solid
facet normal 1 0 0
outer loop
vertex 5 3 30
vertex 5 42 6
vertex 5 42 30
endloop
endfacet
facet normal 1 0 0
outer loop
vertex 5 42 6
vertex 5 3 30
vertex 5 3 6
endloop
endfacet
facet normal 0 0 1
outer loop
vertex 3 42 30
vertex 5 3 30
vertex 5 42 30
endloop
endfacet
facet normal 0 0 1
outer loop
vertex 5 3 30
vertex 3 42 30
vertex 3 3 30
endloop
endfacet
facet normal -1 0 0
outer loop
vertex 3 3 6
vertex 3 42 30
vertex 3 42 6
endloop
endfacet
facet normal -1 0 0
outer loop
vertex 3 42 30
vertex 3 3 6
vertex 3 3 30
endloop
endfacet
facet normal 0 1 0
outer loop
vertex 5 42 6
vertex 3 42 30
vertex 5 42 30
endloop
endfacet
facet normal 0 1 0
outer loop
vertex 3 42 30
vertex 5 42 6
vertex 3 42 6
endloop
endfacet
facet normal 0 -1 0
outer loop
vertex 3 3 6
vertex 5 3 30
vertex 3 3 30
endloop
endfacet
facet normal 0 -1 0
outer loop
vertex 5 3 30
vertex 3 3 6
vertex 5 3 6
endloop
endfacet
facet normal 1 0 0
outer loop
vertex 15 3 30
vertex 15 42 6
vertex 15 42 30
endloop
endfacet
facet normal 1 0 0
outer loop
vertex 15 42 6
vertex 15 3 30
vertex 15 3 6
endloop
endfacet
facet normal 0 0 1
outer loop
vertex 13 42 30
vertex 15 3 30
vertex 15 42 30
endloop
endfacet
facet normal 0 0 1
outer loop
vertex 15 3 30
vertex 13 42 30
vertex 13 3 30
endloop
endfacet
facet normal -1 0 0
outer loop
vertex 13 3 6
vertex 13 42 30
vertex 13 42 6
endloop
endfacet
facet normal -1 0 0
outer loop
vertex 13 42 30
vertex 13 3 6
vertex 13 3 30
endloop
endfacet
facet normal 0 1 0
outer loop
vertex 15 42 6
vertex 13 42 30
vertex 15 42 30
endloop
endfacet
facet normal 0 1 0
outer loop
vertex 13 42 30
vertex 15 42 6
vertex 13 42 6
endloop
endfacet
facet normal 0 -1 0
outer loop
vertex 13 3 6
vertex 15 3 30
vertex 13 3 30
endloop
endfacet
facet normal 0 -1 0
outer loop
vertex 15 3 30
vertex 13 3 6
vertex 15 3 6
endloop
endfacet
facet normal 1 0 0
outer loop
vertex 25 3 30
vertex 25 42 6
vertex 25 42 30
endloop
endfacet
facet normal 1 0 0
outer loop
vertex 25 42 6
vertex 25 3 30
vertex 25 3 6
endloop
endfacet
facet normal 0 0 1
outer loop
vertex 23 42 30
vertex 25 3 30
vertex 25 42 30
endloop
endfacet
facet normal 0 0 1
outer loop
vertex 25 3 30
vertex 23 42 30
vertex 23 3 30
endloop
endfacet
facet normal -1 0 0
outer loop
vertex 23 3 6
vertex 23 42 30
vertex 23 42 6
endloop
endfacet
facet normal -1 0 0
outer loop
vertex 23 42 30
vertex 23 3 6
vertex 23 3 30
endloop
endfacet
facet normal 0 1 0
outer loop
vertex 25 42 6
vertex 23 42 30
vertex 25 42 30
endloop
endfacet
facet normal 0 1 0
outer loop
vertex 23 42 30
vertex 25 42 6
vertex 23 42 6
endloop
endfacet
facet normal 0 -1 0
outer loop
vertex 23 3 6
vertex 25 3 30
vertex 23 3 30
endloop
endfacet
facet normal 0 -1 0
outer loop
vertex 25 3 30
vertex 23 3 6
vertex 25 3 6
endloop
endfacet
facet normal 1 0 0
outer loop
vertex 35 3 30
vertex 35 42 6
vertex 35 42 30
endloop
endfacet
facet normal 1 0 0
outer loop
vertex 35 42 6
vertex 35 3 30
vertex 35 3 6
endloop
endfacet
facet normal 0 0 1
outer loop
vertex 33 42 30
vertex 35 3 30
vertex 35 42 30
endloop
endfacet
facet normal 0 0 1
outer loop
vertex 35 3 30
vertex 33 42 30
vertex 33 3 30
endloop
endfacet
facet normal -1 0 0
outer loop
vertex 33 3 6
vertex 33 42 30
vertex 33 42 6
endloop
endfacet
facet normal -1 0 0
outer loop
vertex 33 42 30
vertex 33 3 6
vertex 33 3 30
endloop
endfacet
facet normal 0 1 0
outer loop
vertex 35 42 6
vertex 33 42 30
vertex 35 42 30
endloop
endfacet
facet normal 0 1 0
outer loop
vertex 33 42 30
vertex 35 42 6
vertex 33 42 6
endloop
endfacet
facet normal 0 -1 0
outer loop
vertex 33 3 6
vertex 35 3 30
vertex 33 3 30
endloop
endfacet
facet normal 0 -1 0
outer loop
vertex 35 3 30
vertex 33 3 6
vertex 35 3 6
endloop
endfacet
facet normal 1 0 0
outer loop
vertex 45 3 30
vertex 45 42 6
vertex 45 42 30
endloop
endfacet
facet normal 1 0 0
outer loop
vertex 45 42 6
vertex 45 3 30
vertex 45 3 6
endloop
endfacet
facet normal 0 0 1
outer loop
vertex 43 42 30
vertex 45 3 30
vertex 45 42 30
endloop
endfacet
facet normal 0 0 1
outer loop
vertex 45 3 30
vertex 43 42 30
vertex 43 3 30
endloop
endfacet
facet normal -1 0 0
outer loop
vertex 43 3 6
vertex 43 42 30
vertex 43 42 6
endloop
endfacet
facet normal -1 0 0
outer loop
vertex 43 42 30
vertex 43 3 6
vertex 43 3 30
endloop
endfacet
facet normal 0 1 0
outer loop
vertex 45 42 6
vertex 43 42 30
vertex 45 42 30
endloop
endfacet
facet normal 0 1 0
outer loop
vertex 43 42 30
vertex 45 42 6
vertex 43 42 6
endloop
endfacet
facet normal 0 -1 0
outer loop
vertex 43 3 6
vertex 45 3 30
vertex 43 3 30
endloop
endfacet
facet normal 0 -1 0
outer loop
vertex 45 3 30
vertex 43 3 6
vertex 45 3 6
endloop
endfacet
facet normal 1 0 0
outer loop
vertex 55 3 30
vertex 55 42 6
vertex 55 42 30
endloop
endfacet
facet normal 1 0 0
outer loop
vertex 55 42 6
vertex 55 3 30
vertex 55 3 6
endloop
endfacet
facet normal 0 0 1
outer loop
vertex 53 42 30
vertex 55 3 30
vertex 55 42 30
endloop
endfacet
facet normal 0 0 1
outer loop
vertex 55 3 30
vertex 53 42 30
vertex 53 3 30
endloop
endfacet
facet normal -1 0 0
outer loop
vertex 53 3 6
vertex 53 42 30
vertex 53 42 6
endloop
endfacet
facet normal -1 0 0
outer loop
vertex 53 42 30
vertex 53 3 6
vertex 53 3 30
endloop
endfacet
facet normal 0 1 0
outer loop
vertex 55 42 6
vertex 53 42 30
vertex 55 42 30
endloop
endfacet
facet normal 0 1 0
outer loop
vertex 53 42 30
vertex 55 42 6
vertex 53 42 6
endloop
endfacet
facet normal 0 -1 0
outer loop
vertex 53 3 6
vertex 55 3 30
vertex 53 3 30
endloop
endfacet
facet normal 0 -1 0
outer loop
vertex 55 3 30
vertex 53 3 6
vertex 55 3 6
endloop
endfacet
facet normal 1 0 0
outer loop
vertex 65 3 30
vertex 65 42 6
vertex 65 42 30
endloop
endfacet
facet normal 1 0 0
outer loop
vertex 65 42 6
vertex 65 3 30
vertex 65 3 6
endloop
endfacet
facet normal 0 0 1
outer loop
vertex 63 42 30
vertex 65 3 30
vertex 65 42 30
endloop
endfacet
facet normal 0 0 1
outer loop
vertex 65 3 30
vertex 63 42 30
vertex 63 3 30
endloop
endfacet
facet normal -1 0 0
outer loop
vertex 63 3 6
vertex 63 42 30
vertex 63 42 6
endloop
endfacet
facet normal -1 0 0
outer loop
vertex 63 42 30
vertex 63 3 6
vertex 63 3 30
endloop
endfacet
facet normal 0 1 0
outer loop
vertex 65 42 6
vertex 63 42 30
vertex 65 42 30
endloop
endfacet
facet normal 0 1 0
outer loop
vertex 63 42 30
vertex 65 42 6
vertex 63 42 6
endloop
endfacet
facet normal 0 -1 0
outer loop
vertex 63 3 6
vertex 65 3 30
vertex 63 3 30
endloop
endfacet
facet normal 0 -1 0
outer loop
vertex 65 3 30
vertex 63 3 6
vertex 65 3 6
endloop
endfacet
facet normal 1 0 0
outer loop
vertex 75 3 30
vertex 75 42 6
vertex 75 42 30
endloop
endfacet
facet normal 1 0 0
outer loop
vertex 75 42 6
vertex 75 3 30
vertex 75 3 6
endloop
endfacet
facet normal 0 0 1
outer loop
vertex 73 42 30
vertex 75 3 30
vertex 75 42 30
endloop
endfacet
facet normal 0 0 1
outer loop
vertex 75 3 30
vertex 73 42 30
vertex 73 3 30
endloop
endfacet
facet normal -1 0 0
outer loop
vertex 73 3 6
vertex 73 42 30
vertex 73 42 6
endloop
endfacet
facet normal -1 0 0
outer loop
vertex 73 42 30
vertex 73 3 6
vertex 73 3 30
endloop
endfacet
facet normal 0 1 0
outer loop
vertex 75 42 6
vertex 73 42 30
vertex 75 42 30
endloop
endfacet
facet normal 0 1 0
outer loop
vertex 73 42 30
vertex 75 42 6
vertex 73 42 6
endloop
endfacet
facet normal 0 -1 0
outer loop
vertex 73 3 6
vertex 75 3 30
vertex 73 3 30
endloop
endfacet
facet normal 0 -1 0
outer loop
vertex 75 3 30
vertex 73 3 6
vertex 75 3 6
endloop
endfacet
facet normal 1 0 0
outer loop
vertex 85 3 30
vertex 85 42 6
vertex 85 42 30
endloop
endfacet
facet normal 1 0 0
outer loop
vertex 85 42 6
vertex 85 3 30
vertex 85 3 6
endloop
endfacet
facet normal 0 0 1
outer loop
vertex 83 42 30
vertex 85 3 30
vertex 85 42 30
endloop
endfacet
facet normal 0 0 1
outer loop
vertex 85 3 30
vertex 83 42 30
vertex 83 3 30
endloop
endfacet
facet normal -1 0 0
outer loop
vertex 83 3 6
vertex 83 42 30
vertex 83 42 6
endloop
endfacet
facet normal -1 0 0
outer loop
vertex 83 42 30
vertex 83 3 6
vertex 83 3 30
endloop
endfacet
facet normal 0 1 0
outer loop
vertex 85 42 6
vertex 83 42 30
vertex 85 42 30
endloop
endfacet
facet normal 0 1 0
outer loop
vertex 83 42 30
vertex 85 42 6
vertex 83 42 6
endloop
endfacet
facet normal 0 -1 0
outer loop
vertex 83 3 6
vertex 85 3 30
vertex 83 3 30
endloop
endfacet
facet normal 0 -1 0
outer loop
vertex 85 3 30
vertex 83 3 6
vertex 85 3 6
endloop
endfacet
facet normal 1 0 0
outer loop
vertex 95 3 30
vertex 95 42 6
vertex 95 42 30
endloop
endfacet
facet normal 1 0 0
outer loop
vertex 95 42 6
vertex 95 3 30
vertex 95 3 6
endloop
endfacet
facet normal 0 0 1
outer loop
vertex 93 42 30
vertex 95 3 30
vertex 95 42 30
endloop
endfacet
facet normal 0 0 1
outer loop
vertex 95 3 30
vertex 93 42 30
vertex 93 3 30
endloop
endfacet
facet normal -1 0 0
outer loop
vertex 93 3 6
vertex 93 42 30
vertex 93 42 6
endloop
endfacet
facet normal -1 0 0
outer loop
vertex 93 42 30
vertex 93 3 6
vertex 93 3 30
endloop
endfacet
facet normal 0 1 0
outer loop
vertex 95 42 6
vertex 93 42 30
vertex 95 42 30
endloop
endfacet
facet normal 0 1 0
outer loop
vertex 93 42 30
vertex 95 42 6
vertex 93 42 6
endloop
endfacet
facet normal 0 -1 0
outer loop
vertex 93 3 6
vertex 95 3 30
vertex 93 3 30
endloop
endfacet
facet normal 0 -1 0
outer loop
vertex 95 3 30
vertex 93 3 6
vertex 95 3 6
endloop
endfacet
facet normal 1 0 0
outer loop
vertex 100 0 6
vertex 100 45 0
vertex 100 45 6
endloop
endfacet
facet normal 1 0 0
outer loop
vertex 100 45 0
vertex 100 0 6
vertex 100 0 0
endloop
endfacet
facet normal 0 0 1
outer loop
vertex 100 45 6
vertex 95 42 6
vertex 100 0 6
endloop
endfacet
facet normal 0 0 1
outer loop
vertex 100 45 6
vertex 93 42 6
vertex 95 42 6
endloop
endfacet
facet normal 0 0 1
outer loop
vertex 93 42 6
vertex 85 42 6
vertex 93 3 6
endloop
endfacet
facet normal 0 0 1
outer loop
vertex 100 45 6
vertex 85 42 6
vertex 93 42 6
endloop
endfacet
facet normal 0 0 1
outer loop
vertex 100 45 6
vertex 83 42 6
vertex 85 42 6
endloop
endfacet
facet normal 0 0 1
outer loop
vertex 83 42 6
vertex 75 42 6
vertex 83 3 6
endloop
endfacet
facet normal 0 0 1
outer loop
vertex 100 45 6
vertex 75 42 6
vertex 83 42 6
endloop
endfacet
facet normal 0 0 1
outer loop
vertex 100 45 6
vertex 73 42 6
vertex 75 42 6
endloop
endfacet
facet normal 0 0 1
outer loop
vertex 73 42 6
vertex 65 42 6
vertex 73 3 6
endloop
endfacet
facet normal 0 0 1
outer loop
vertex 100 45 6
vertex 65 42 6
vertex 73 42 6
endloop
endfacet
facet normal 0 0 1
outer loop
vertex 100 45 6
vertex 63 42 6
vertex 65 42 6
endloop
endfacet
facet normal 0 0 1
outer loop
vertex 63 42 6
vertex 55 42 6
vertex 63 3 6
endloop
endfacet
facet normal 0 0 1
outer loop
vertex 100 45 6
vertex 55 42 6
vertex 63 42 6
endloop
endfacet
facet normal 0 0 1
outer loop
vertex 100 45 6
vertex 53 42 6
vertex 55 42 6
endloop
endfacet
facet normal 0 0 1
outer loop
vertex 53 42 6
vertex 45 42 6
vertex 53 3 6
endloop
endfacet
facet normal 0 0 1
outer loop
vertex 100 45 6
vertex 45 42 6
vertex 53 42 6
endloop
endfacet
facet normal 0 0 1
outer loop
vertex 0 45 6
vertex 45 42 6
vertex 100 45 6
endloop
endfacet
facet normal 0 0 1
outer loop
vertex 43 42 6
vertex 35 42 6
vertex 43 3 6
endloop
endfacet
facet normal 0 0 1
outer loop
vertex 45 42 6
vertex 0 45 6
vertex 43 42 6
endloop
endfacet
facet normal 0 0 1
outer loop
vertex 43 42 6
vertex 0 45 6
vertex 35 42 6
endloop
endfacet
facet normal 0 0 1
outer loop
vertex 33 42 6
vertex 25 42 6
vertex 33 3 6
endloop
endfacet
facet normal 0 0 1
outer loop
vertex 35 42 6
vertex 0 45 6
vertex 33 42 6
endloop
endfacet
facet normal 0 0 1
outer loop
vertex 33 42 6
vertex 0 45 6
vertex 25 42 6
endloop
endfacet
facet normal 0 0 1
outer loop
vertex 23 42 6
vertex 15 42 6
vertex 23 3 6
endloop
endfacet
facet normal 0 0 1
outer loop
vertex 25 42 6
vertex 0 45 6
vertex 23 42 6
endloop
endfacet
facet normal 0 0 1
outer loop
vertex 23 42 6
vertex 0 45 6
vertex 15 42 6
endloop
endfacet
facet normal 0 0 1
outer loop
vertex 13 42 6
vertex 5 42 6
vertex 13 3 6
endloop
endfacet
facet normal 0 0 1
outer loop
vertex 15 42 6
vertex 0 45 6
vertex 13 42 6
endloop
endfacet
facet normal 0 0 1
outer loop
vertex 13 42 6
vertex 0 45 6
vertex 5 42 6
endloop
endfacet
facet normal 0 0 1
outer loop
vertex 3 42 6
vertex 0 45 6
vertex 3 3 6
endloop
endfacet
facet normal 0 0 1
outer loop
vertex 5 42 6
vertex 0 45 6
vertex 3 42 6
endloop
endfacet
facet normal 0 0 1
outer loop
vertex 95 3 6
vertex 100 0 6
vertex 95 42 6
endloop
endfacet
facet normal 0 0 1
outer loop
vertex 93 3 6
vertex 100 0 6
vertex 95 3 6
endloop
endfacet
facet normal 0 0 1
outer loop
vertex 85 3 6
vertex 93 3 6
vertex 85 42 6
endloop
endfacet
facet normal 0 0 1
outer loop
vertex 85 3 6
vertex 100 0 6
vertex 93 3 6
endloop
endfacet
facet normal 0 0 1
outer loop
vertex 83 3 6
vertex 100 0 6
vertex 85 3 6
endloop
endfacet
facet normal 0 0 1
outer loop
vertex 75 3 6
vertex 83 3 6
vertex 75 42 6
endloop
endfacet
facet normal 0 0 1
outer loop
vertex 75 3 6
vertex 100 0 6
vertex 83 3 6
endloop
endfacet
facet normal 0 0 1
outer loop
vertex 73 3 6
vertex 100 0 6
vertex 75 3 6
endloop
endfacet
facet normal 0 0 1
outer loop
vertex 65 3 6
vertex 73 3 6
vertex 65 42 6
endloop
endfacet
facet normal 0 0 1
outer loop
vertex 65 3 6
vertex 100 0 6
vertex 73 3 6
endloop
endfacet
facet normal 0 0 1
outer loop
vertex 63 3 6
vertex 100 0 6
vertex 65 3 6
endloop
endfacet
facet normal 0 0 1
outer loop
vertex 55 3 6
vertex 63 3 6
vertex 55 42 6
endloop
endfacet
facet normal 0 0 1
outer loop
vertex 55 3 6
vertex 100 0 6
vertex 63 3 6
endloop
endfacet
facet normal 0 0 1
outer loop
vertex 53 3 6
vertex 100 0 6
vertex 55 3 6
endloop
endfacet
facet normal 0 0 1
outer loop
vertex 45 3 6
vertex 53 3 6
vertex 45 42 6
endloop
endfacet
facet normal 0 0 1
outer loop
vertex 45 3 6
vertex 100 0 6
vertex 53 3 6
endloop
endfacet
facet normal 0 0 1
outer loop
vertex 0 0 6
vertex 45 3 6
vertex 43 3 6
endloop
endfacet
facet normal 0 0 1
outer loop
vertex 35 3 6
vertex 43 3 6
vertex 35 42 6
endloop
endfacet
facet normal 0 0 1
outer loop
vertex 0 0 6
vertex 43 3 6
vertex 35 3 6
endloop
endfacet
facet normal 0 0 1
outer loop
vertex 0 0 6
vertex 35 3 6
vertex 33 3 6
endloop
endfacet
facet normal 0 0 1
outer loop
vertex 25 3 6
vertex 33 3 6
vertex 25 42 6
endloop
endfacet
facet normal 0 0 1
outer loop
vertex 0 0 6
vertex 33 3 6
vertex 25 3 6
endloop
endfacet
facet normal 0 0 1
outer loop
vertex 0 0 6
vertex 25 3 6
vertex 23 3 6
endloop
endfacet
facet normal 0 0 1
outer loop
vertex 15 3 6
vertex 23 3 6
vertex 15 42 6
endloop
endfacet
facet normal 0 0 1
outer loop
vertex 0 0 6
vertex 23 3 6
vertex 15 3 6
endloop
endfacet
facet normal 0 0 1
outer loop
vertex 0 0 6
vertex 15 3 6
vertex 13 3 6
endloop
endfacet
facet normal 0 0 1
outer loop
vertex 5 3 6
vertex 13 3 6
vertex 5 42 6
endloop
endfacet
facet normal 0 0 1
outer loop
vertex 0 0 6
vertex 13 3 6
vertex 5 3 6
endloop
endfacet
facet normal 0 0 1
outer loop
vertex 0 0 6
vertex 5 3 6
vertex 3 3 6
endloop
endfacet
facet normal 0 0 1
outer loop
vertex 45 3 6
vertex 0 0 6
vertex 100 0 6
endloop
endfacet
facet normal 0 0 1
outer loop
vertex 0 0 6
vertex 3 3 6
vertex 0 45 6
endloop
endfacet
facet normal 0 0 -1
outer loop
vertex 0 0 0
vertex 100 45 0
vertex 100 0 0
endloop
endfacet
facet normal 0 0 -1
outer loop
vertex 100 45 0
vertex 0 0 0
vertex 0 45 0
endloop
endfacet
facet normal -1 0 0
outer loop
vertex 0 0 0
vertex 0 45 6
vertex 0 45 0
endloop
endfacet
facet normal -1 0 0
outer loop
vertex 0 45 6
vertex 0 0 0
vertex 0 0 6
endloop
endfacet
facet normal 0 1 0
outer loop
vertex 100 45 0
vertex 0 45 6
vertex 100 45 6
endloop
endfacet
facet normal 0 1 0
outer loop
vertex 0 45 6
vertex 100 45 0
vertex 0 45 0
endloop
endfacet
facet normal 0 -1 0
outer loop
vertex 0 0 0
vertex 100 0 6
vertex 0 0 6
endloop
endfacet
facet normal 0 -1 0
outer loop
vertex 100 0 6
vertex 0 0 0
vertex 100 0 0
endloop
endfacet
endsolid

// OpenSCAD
$fn = 32;

// ----------------------------------------------------------------------
// Heatsink: uniform fin block
// ----------------------------------------------------------------------

// --- parameters (mm) ---
base_l = 100;             // base length, X
base_w = 45;              // base width, Y
base_t = 6;               // base plate thickness
fin_h = 25;               // fin height above the base
fin_t = 2;                // fin thickness
edge = 3;                 // margin from the base ends
pitch = 10;               // fin pitch

n_fins = floor((base_l - 2 * edge - fin_t) / pitch) + 1;  // fin count
total_h = base_t + fin_h - 1;  // overall height

union() {
  cube([base_l, base_w, base_t]);
  for (i = [0 : n_fins - 1])
    translate([edge + i * pitch, edge, base_t - 1])
      cube([fin_t, base_w - 2 * edge, fin_h]);
}
